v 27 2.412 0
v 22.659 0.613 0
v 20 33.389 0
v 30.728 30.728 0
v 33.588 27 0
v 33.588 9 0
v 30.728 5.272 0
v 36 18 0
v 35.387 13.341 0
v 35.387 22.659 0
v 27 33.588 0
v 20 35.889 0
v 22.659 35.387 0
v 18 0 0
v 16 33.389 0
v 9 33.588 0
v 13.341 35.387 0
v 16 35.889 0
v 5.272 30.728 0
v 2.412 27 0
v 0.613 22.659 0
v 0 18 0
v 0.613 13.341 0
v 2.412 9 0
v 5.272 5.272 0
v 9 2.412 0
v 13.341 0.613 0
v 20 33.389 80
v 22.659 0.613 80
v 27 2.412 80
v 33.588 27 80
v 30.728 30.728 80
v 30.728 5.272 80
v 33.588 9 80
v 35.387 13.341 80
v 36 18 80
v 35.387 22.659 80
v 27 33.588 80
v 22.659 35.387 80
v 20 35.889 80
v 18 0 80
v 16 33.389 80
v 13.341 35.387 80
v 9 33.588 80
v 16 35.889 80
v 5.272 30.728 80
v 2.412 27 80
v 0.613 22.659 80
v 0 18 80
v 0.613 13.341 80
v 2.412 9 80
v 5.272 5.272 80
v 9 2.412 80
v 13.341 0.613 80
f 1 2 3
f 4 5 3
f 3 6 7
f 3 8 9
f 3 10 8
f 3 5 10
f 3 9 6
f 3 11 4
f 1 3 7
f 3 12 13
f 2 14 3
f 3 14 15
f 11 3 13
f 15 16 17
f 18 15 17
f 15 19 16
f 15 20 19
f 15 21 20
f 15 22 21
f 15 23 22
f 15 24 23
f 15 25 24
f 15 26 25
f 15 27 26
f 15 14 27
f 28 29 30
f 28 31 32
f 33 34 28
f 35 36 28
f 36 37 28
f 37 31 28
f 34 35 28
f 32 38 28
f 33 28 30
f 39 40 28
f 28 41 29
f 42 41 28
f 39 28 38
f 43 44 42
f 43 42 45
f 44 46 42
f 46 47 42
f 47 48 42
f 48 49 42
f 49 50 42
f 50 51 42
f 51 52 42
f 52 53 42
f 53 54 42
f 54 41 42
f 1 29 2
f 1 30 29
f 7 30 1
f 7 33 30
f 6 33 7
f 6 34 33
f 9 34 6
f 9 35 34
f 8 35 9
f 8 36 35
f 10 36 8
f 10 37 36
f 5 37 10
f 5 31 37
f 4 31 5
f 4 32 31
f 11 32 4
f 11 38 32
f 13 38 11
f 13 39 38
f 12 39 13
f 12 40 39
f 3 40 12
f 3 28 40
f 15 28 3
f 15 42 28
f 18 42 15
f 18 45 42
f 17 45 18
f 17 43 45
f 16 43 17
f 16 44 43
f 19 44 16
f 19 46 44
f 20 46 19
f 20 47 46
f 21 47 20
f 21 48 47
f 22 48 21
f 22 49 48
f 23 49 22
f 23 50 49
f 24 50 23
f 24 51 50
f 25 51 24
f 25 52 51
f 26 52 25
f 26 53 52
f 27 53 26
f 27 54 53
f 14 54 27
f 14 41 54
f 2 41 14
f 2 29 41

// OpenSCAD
$fn = 32;

// ----------------------------------------------------------------------
// Keyway shaft: d36 shaft, key 4 x 2.5 mm
// ----------------------------------------------------------------------

// --- parameters (mm) ---
shaft_r = 18;             // shaft radius
key_w = 4;                // keyway width
key_d = 2.5;              // keyway depth below the surface line
plate_t = 80;             // shaft length, Z (extrusion height)

shaft_d = 2 * shaft_r;  // shaft diameter
circle_step = 15;  // polygon sampling step, degrees

profile = [[13.341, 35.387], [9, 33.588], [5.272, 30.728], [2.412, 27], [0.613, 22.659], [0, 18], [0.613, 13.341], [2.412, 9], [5.272, 5.272], [9, 2.412], [13.341, 0.613], [18, 0], [22.659, 0.613], [27, 2.412], [30.728, 5.272], [33.588, 9], [35.387, 13.341], [36, 18], [35.387, 22.659], [33.588, 27], [30.728, 30.728], [27, 33.588], [22.659, 35.387], [20, 35.889], [20, 33.389], [16, 33.389], [16, 35.889]];  // primary outline, 27 points, counter clockwise

// --- the one profile operation ---
linear_extrude(height = plate_t) polygon(points = profile);
